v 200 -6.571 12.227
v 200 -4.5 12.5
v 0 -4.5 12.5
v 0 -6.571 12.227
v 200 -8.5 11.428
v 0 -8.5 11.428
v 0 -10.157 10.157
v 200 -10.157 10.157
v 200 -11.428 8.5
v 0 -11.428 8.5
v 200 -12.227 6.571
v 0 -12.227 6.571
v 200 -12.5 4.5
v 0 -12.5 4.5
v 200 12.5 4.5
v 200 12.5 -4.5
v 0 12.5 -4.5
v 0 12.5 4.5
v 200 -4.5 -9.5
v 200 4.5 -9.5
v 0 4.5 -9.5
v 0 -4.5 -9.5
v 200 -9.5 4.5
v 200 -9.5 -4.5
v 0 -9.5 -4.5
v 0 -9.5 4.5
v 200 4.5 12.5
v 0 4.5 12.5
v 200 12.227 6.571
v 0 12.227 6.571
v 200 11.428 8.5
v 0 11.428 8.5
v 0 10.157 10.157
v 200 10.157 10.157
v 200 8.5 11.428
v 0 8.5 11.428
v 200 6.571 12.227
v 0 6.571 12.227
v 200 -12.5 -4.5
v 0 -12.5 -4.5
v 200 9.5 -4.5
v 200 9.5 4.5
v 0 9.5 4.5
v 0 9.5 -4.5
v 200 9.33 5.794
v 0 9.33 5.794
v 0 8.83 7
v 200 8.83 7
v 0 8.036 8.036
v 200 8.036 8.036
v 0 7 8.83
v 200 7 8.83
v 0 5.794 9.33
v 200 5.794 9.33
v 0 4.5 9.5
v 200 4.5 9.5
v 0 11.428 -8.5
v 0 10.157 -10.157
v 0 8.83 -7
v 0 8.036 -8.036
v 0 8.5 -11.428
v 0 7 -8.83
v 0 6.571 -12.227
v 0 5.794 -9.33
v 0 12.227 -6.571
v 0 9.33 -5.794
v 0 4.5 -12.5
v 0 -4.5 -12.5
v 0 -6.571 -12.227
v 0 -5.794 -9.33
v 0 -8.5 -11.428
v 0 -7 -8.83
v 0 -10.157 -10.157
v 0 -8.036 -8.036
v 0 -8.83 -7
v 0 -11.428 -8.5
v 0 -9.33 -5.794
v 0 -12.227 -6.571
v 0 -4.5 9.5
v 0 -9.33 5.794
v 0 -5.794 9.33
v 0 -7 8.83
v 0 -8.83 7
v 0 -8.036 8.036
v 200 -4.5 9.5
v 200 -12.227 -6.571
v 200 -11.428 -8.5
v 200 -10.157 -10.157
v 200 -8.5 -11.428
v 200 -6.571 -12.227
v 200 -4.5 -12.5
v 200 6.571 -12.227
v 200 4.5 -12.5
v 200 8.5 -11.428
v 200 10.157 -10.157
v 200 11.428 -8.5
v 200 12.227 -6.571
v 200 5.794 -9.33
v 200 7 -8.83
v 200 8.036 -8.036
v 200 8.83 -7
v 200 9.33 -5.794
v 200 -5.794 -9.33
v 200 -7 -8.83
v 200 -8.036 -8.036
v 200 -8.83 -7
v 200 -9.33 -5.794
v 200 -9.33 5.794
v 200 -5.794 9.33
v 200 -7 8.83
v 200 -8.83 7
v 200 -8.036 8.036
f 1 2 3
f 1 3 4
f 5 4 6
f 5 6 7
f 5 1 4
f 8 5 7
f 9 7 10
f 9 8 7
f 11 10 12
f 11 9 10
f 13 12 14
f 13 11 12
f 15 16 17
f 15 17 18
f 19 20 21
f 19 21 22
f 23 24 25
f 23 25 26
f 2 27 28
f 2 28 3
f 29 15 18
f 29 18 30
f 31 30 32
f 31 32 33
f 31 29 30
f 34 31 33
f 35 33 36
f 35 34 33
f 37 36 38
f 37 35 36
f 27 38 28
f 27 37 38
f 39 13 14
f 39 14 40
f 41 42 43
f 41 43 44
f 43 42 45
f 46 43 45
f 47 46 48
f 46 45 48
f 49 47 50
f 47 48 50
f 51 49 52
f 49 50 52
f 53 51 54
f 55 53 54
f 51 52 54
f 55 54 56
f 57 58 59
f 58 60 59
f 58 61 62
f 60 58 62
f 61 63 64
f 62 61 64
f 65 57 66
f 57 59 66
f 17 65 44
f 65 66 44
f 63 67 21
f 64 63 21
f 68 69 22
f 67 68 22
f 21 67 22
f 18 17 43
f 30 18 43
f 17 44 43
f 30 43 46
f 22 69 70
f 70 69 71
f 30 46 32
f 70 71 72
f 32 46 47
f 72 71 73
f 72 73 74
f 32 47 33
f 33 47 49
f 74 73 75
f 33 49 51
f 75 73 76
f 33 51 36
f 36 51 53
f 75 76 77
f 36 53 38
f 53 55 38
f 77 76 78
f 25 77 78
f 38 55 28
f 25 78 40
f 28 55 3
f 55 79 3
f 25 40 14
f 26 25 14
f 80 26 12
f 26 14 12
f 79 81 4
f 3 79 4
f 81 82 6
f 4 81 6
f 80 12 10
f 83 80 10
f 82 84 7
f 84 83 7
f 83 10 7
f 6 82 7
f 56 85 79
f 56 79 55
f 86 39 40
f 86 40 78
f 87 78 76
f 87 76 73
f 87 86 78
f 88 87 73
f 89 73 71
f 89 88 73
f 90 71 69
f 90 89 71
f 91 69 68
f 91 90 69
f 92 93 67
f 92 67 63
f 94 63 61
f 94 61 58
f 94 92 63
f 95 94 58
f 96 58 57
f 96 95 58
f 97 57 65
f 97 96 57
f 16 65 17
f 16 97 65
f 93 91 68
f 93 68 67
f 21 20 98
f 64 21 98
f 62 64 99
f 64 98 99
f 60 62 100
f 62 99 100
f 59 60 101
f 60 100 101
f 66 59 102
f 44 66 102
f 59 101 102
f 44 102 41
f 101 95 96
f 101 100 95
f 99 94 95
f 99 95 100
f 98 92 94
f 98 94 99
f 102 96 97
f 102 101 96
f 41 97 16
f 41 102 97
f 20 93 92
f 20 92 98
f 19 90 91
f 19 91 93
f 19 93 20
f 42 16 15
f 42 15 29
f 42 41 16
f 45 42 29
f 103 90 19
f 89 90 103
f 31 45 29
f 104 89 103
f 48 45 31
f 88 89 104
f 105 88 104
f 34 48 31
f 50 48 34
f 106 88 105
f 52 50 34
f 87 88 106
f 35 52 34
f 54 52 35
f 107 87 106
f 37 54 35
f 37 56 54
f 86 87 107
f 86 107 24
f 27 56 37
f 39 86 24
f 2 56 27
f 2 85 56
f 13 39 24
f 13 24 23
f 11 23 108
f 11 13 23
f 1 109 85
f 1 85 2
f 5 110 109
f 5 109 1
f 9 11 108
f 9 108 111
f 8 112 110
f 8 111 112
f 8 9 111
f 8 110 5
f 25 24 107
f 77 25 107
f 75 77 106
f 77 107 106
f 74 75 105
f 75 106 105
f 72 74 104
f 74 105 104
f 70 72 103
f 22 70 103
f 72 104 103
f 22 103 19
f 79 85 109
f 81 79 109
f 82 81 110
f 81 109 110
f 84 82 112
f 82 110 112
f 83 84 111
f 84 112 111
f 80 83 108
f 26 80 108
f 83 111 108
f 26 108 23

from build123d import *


with BuildPart() as part:
    # Sweep-Thin1: sweep along a path in Sketch3
    with BuildLine(Plane(origin=(0, 0, 0), x_dir=(1, 0, 0), z_dir=(0, 1, 0))) as sweep_thin1_path:
        Line((0, 0), (200, 0))
    # Sketch2 → Sweep-Thin1 (sweep)
    with BuildSketch(Plane(origin=(0, 0, 0), x_dir=(0, 0, -1), z_dir=(1, 0, 0))):
        with BuildLine():
            Line((4.5, 12.5), (-4.5, 12.5))
            ThreePointArc((-4.5, 12.5), (-10.156854249, 10.156854249), (-12.5, 4.5))
            Line((-12.5, 4.5), (-12.5, -4.5))
            ThreePointArc((-12.5, -4.5), (-10.156854249, -10.156854249), (-4.5, -12.5))
            Line((-4.5, -12.5), (4.5, -12.5))
            ThreePointArc((4.5, -12.5), (10.156854249, -10.156854249), (12.5, -4.5))
            Line((12.5, -4.5), (12.5, 4.5))
            ThreePointArc((12.5, 4.5), (10.156854249, 10.156854249), (4.5, 12.5))
        make_face()
        with BuildLine():
            Line((4.5, 9.5), (-4.5, 9.5))
            ThreePointArc((-4.5, 9.5), (-8.035533906, 8.035533906), (-9.5, 4.5))
            Line((-9.5, 4.5), (-9.5, -4.5))
            ThreePointArc((-9.5, -4.5), (-8.035533906, -8.035533906), (-4.5, -9.5))
            Line((-4.5, -9.5), (4.5, -9.5))
            ThreePointArc((4.5, -9.5), (8.035533906, -8.035533906), (9.5, -4.5))
            Line((9.5, -4.5), (9.5, 4.5))
            ThreePointArc((9.5, 4.5), (8.035533906, 8.035533906), (4.5, 9.5))
        make_face(mode=Mode.SUBTRACT)
    sweep(path=sweep_thin1_path.line)


solid = part.part
